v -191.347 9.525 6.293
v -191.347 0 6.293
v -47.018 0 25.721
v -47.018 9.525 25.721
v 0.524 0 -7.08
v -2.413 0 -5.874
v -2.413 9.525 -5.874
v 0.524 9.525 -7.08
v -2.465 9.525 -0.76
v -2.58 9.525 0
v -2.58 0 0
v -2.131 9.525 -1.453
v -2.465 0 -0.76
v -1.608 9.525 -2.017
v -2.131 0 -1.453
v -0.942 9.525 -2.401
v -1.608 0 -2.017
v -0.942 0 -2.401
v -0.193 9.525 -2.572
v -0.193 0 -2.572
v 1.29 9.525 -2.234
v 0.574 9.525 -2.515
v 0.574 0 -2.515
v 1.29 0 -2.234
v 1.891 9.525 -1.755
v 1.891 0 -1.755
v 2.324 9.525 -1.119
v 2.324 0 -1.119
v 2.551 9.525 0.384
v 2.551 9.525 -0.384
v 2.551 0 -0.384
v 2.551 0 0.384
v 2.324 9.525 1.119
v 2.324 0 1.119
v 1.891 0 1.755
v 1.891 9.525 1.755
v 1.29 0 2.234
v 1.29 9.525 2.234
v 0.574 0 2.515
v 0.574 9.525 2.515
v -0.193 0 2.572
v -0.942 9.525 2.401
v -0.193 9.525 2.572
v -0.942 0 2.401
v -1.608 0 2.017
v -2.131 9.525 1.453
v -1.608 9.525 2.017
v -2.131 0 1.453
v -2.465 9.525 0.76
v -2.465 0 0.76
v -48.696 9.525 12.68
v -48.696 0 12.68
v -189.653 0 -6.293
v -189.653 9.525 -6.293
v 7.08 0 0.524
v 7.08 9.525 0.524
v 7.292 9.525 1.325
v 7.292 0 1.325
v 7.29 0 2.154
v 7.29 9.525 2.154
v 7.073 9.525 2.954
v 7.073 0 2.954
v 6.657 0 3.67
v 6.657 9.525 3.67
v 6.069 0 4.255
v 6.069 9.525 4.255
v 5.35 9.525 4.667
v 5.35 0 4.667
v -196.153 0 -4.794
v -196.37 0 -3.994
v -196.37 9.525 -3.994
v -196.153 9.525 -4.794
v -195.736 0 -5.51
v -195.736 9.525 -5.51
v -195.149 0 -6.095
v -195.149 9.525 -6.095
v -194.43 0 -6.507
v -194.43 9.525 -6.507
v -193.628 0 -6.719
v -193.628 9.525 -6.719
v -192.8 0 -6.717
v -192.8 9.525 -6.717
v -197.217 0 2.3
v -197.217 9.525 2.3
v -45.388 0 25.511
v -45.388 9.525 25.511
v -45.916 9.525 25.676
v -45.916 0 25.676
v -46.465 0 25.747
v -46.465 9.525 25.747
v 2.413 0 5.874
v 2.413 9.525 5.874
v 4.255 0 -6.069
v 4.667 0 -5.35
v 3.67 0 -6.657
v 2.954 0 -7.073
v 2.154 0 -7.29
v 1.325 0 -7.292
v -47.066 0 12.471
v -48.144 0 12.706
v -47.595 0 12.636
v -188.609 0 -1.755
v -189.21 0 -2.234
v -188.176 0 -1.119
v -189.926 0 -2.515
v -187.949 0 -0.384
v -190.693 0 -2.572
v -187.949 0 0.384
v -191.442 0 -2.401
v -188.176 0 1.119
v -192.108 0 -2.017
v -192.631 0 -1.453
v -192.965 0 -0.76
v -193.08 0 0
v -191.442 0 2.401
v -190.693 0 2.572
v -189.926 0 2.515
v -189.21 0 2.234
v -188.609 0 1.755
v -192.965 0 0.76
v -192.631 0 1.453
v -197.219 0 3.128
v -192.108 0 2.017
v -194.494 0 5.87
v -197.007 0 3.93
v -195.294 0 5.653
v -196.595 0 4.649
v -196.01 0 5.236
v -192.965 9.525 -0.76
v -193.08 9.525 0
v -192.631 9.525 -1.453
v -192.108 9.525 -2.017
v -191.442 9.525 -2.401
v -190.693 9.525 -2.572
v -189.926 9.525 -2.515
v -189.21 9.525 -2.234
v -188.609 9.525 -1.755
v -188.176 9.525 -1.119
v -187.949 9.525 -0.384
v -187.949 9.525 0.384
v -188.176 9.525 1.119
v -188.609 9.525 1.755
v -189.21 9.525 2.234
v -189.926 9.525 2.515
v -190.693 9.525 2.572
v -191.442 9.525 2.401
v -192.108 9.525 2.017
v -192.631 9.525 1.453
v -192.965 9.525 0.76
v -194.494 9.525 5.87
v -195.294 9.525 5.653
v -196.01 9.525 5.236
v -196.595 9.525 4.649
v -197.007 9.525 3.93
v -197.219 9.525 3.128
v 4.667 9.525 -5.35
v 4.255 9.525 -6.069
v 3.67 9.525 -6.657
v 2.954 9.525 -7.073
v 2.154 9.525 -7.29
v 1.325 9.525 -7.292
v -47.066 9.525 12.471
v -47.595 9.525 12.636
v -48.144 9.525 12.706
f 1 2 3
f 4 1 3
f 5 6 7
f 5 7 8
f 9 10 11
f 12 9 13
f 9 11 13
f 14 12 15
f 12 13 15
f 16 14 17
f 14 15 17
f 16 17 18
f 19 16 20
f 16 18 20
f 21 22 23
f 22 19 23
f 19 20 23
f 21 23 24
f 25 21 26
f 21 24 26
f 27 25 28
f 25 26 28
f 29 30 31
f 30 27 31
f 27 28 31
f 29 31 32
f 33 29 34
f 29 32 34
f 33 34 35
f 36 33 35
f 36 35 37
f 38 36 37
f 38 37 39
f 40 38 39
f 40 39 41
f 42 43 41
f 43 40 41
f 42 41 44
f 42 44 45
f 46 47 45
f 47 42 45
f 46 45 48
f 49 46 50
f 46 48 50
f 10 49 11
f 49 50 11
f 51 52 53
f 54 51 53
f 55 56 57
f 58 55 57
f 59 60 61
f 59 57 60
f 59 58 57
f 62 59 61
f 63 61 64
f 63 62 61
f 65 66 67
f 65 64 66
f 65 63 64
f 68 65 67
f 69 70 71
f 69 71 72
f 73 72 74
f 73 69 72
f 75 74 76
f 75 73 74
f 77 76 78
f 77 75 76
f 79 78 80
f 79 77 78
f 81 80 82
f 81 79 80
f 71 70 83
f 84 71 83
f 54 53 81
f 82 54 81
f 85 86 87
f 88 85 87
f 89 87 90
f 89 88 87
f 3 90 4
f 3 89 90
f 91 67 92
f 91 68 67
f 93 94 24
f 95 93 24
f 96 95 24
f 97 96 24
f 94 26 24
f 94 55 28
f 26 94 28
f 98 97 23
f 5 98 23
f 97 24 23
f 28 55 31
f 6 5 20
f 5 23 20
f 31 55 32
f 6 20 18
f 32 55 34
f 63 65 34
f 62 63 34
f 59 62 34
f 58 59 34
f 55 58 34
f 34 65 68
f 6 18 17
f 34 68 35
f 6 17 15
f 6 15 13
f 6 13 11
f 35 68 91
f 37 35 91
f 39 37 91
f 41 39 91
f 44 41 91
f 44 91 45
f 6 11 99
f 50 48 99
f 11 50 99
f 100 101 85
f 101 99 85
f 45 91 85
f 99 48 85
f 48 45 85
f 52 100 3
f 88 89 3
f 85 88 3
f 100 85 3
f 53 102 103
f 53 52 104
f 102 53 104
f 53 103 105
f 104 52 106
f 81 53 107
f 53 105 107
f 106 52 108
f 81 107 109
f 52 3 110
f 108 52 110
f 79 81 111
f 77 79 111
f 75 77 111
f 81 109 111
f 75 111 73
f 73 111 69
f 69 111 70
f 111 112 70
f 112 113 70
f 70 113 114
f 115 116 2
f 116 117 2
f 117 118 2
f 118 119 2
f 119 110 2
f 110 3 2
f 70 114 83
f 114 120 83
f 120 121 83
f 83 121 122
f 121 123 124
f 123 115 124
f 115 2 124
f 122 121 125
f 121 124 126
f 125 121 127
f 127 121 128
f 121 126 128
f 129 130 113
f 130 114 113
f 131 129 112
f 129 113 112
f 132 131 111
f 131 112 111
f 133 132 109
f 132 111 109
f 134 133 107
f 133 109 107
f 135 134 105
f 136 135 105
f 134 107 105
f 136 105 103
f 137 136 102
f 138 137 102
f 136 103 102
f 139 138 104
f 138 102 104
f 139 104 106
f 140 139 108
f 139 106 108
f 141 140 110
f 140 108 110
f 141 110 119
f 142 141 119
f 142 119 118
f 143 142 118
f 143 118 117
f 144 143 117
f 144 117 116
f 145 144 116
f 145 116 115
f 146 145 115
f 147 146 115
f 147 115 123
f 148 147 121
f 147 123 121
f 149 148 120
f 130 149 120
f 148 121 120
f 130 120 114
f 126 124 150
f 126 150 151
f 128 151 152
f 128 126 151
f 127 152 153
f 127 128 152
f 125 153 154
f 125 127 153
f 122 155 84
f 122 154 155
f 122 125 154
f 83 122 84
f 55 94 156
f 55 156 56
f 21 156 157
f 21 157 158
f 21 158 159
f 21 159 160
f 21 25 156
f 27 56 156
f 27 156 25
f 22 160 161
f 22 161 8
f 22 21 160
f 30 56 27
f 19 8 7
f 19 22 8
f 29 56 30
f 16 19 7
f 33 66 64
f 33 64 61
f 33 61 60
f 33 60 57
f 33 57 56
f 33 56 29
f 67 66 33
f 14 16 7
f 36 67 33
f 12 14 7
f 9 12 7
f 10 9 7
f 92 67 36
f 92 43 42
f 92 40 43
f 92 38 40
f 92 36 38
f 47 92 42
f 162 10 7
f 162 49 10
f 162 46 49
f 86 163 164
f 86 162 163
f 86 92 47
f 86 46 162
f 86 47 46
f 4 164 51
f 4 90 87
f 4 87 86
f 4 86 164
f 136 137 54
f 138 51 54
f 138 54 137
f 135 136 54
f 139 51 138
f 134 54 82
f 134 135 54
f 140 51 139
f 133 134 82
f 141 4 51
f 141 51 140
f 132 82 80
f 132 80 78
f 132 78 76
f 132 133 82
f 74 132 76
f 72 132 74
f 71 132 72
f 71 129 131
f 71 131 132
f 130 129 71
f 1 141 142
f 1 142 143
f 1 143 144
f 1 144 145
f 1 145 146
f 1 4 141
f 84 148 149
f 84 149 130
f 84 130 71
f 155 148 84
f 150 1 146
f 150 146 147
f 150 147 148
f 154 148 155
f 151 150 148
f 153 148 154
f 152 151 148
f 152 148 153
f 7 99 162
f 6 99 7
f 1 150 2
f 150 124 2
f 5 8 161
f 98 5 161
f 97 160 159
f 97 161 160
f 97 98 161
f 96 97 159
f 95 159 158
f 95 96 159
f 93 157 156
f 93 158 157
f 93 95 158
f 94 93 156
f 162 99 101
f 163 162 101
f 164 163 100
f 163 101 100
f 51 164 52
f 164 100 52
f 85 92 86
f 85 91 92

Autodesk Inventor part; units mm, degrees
ref_plane "YZ Plane" through (0, 0, 0) normal (1, 0, 0) x (0, 1, 0)
ref_plane "XZ Plane" through (0, 0, 0) normal (0, 1, 0) x (-1, 0, 0)
ref_plane "XY Plane" through (0, 0, 0) normal (0, 0, 1) x (1, 0, 0)
sketch "Sketch1" plane through (0, 0, 0) normal (0, 1, 0) x (-1, 0, 0)
  line L0 (0, 0) -> (190.5, 0)
  line L1 (190.5, 0) -> (47.0141, 19.3142)
  line L2 (47.0141, 19.3142) -> (0, 0)
  line L3 (2.413, -5.8737) -> (-2.413, 5.8737)
  line L4 (-2.413, 5.8737) -> (45.388, 25.5111)
  line L5 (47.0663, 12.4707) -> (2.413, -5.8737)
  line L6 (41.2492, 26.4974) -> (39.555, 13.9109)
  line L7 (48.6964, 12.6805) -> (189.6529, -6.2932)
  line L8 (189.6529, -6.2932) -> (191.3471, 6.2932)
  line L9 (191.3471, 6.2932) -> (47.0181, 25.7209)
  arc A0 (47.0181, 25.7209) -> (45.388, 25.5111) centre (46.5945, 22.5743) ccw
  arc A1 (48.6964, 12.6805) -> (47.0663, 12.4707) centre (48.2728, 9.5338) ccw
  circle A2 centre (47.0141, 19.3142) radius 2.5797
  circle A3 centre (190.5, 0) radius 2.5797
  circle A4 centre (0, 0) radius 2.5797
  line L10 (191.3471, 6.2932) -> (189.6529, -6.2932)
  line L11 (189.6529, -6.2932) -> (192.7995, -6.7168)
  line L12 (196.3697, -3.9937) -> (197.2168, 2.2995)
  line L13 (194.4937, 5.8697) -> (191.3471, 6.2932)
  arc A5 (197.2168, 2.2995) -> (194.4937, 5.8697) centre (194.0702, 2.7231) ccw
  arc A6 (192.7995, -6.7168) -> (196.3697, -3.9937) centre (193.2231, -3.5702) ccw
  line L14 (-2.413, 5.8737) -> (2.413, -5.8737)
  line L15 (2.413, -5.8737) -> (-0.5238, -7.0802)
  line L16 (-4.6672, -5.3498) -> (-7.0802, 0.5238)
  line L17 (-5.3498, 4.6672) -> (-2.413, 5.8737)
  arc A7 (-5.3498, 4.6672) -> (-7.0802, 0.5238) centre (-4.1433, 1.7303) ccw
  arc A8 (-4.6672, -5.3498) -> (-0.5238, -7.0802) centre (-1.7303, -4.1433) ccw
  point P0 (195.9461, -7.1404)
  point P1 (-3.4607, -8.2867)
  dimension "d0" = 190.5
  dimension "d1" = 150
  dimension "d2" = 12.7
  dimension "d3" = 3.175
  dimension "d4" = 5.1594
  dimension "d6" = 6.35
  dimension "d7" = 3.175
  dimension "d8" = 6.35
  dimension "d9" = 3.175
  dimension "d12" = 144.78
  dimension "d13" = 12.7
  dimension "d14" = 12.7
extrude "Extrusion1" add sketch "Sketch1" along normal blind 9.525 contours A4 L2 A2 L1 A3 L0 L7 A1 L5 | L0 L5 L3 A4 | A4 L3 L4 L6 L2 | L3 L15 A8 L16 A7 L17 A4 | L6 L4 A0 L9 L8 A3 L1 A2 L2 | L0 A3 L8 L7 | A2 L1 L2 | L2 L1 A2 | L8 A3 L13 A5 L12 A6 L11
